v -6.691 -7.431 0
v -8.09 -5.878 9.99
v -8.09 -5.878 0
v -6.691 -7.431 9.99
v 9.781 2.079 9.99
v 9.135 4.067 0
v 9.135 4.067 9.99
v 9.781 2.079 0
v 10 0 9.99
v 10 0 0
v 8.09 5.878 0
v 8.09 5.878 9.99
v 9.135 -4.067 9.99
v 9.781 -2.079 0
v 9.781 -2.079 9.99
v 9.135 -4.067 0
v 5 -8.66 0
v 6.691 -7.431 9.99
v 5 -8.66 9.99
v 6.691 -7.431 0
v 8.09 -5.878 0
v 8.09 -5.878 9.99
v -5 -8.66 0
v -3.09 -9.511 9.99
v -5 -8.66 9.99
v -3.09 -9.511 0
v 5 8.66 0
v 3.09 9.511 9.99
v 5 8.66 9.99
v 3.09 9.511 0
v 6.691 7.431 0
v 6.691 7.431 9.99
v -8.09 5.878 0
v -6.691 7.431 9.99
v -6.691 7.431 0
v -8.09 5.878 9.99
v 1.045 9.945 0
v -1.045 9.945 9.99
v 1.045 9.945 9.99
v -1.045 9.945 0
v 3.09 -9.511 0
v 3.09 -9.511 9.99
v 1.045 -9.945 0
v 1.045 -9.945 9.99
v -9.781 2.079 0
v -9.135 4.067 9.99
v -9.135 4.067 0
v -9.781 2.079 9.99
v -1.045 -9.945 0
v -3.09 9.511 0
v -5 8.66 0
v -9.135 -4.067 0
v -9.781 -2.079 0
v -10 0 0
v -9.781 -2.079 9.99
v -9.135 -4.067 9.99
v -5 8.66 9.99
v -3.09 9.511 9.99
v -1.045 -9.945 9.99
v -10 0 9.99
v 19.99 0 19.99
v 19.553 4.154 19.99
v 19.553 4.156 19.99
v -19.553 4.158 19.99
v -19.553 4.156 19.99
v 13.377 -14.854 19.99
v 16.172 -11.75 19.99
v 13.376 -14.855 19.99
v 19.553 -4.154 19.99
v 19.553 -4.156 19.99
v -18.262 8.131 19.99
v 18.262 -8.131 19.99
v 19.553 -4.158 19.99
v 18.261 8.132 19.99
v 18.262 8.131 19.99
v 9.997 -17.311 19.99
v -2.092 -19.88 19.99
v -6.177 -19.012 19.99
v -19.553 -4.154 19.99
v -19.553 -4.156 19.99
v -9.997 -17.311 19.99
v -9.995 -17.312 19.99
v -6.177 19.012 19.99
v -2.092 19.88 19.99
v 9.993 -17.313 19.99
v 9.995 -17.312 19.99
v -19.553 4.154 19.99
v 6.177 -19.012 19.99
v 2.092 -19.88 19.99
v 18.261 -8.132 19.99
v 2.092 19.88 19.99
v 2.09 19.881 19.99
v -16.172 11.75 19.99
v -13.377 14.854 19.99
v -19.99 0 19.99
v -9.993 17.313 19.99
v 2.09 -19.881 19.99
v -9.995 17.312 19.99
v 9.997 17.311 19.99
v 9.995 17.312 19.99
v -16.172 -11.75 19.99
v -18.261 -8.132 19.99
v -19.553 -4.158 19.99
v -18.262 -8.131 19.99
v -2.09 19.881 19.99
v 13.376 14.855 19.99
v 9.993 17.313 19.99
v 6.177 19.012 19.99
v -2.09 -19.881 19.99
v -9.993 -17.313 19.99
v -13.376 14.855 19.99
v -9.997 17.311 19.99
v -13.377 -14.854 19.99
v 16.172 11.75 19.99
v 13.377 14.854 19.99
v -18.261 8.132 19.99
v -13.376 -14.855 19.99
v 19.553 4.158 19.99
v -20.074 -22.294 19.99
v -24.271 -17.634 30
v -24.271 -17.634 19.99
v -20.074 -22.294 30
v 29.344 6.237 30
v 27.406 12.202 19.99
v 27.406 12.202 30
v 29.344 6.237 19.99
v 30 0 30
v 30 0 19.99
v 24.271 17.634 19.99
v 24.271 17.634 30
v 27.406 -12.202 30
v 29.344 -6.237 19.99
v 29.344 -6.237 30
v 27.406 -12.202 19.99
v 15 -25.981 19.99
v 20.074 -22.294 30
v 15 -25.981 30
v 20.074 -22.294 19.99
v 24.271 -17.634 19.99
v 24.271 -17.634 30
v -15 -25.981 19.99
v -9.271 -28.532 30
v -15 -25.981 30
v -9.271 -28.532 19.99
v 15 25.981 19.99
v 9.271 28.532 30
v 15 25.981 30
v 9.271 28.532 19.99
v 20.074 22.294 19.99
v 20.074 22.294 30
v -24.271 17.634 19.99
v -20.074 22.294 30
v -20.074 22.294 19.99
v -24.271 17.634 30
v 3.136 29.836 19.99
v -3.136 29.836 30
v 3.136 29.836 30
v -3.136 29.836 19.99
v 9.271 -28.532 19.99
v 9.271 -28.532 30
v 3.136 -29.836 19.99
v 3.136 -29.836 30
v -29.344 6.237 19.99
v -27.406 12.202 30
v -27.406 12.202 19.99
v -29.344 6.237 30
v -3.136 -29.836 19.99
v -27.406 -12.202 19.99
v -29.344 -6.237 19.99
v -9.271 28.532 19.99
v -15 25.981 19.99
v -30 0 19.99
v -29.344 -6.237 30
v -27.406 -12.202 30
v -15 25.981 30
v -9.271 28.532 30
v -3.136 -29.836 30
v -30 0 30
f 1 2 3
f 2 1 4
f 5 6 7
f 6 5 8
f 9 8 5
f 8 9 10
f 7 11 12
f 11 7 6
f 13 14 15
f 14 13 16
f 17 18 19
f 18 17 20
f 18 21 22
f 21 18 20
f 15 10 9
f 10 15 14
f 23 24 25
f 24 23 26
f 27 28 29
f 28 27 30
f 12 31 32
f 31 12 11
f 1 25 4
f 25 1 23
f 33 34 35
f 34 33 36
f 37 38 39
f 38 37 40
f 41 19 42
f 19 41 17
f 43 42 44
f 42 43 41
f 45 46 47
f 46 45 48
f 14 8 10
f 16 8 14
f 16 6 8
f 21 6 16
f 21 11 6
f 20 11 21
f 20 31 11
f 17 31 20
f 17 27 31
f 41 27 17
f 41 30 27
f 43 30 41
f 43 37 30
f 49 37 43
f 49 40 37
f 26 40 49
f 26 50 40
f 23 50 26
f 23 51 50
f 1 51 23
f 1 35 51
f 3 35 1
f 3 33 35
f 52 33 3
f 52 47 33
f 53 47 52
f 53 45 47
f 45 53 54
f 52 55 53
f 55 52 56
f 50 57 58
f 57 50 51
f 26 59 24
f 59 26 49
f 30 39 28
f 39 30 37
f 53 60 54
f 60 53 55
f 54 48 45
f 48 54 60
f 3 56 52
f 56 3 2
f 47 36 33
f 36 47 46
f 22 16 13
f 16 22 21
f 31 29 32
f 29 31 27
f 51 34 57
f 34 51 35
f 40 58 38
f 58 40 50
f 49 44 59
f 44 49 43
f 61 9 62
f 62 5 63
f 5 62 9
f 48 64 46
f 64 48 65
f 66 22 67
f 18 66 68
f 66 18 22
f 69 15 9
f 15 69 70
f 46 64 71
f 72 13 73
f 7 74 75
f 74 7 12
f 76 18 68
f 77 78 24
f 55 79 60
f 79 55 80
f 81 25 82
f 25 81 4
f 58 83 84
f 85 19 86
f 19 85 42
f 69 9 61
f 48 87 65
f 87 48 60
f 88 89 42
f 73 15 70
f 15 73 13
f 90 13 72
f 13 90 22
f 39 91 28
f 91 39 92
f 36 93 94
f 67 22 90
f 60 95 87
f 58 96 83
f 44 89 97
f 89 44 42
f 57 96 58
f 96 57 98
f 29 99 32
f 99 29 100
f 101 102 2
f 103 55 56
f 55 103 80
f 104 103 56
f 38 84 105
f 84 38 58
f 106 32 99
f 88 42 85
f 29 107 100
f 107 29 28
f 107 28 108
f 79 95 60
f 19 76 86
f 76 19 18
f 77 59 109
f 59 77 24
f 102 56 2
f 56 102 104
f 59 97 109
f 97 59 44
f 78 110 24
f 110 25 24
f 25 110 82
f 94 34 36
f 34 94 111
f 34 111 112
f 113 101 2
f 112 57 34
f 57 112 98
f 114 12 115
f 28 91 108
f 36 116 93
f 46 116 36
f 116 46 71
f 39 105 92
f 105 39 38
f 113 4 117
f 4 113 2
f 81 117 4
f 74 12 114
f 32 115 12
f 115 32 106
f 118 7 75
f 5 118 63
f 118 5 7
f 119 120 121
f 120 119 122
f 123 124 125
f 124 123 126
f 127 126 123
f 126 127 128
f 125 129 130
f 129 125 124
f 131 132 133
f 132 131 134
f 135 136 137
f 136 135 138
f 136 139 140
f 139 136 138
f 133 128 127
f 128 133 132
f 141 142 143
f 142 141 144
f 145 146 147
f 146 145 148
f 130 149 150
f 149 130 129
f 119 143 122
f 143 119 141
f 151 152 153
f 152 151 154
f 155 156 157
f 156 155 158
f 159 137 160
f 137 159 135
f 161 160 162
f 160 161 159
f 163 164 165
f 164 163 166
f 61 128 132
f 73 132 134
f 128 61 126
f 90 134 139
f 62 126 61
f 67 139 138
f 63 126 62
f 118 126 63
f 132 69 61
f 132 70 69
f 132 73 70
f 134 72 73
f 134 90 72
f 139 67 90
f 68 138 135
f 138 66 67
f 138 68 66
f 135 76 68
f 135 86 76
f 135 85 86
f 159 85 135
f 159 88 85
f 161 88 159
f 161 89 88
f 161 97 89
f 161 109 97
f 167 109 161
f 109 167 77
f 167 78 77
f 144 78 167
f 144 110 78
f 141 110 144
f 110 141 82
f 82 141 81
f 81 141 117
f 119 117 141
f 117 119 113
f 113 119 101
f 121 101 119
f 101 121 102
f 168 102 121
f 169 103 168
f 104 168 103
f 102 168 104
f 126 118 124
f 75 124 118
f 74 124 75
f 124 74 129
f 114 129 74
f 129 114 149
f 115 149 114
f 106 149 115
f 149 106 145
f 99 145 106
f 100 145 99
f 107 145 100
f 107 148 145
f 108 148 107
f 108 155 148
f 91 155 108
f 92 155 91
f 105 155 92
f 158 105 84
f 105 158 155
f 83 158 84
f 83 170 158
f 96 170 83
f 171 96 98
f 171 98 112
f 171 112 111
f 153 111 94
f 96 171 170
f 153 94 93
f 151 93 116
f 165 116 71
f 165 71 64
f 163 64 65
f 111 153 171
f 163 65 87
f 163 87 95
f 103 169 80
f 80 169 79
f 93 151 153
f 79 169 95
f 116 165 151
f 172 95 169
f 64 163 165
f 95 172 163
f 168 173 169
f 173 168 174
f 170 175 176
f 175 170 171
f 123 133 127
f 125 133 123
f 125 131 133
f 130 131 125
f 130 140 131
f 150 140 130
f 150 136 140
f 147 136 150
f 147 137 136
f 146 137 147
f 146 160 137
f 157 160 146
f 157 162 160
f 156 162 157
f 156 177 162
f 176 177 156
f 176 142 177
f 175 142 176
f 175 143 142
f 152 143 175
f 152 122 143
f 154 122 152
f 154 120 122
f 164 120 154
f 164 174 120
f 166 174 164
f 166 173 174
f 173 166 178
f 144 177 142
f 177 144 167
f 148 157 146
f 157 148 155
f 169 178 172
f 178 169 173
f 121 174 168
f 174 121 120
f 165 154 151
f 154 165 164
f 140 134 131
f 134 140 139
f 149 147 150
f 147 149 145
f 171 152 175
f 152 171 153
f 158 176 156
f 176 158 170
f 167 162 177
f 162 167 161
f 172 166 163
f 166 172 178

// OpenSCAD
module screw_hole(r1, h1, r2, h2, r3, h3){
    d = 0.01;

    union() {
        cylinder(h=h1, r=r1);
        translate([0, 0, h1-d]) cylinder(h=h2+d, r1=r1, r2=r2);
        translate([0, 0, h1+h2-d]) cylinder(h=h3+d, r=r3);
    }
}

screw_hole(r1=10, h1=10, r2=20, h2=10, r3=30, h3=10);
